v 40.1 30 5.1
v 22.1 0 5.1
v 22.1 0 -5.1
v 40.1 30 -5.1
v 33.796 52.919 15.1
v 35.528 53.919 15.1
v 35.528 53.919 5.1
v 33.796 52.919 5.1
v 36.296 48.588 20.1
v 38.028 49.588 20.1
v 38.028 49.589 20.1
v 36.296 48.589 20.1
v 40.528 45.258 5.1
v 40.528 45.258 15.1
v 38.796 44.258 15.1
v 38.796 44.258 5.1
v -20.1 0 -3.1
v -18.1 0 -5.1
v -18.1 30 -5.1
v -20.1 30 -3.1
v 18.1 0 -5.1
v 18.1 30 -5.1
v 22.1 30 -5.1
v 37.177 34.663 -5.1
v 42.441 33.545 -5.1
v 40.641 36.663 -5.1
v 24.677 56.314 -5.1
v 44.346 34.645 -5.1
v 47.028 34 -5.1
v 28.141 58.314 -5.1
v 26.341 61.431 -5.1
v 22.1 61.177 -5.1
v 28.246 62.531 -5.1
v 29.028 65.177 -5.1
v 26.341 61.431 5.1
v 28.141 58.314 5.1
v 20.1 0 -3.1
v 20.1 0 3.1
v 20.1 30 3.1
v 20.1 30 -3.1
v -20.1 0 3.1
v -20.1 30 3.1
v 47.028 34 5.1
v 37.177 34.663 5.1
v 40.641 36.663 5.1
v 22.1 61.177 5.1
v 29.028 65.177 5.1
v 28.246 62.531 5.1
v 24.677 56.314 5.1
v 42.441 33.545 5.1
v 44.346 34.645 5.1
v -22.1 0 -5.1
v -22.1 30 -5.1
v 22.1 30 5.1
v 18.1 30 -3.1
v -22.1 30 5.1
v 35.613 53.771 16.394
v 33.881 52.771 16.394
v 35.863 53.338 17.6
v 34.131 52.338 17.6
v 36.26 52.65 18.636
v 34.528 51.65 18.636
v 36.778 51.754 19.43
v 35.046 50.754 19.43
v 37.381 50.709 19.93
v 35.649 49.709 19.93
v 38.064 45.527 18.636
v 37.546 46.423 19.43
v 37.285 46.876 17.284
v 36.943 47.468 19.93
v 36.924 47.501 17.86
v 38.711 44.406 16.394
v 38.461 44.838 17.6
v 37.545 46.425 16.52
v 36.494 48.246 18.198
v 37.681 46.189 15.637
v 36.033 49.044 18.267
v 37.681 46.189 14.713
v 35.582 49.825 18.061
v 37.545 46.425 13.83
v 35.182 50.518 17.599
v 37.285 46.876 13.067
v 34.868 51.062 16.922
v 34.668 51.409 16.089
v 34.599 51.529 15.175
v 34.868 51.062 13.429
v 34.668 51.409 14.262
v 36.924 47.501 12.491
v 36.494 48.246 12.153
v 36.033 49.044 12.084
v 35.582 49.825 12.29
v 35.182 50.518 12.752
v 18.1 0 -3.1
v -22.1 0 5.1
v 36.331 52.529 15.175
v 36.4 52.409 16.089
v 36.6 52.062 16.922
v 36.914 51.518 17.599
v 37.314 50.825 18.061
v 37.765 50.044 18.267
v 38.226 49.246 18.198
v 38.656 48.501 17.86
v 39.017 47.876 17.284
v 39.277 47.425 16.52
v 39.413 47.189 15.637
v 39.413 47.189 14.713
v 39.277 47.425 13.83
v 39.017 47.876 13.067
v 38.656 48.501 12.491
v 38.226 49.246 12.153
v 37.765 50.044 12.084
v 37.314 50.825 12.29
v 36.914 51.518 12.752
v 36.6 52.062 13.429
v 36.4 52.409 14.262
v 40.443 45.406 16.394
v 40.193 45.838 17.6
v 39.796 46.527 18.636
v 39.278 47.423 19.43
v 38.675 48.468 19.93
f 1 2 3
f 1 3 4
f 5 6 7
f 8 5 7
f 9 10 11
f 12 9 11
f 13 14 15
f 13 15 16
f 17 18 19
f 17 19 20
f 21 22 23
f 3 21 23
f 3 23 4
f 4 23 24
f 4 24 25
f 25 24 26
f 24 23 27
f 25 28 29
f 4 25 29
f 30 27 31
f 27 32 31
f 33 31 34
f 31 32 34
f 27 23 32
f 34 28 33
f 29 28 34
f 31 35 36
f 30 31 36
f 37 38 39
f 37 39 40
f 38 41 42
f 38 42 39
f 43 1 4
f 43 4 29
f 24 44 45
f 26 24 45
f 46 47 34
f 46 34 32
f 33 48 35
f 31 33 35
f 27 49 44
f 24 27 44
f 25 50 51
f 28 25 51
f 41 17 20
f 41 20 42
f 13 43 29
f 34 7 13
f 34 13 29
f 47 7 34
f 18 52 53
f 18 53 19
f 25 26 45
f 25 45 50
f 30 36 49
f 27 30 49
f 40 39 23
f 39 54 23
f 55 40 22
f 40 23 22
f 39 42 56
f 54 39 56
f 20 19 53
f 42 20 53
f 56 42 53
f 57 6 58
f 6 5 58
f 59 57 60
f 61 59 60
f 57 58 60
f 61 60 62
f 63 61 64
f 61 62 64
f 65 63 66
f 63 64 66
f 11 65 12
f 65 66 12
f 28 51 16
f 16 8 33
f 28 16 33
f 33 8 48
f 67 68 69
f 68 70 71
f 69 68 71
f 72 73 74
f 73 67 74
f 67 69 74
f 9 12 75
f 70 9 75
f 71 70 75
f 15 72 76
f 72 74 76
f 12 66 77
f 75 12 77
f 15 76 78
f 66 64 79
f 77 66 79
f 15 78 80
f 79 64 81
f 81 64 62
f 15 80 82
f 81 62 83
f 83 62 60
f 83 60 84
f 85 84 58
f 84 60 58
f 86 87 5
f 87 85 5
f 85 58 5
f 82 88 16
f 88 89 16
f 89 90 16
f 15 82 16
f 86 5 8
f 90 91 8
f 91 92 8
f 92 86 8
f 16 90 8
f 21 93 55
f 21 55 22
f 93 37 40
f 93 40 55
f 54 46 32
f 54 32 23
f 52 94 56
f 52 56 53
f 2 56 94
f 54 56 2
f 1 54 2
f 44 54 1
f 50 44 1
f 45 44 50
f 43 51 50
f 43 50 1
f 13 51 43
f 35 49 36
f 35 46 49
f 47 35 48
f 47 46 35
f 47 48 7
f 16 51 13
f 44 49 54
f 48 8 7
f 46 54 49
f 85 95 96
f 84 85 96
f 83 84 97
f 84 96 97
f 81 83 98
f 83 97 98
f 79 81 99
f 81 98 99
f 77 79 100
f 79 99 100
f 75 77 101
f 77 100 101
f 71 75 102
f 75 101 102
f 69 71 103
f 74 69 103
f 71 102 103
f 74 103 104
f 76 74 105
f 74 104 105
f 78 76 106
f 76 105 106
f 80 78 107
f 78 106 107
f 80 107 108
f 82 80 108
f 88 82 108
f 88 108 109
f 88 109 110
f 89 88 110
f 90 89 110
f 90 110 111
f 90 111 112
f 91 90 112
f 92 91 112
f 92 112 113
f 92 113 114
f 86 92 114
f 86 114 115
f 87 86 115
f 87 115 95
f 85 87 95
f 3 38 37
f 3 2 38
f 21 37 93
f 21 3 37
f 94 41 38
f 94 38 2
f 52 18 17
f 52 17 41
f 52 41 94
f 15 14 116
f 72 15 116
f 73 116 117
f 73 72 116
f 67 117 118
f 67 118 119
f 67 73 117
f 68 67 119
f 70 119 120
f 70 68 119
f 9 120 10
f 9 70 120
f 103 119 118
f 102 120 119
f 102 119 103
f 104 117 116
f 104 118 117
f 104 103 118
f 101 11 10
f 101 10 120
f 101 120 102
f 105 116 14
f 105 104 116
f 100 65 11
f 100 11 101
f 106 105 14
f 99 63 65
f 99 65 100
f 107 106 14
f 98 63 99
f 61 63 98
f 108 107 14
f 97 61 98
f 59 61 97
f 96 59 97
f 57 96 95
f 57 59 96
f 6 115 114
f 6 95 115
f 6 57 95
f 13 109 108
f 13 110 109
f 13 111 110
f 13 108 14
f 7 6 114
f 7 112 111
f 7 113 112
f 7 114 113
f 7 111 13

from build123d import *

# Parameters (mm, degrees)
BOSS_EXTRUDE1_DEPTH = 30
BOSS_EXTRUDE2_DEPTH = 10.2
CUT_EXTRUDE1_DEPTH  = 10.2
SKETCH4_W           = 15
SKETCH4_H           = 10
BOSS_EXTRUDE3_DEPTH = 2
FILLET1_R           = 5
CUT_EXTRUDE2_REACH  = 85.187
SKETCH5_R           = 3.1


with BuildPart() as part:
    # Sketch1 → Boss-Extrude1 (new body)
    with BuildSketch(Plane(origin=(0, 0, 0), x_dir=(1, 0, 0), z_dir=(0, 1, 0))):
        Polygon((18.1, 3.1), (18.1, 5.1), (22.1, 5.1), (22.1, -5.1), (-22.1, -5.1), (-22.1, 5.1), (-18.1, 5.1), (-20.1, 3.1), (-20.1, -3.1), (20.1, -3.1), (20.1, 3.1), align=None)
    extrude(amount=BOSS_EXTRUDE1_DEPTH)

    # Sketch2 → Boss-Extrude2 (add)
    with BuildSketch(Plane.XY.offset(5.1)):
        Polygon((47.02820323, 34), (29.02820323, 65.176914536), (22.1, 61.176914536), (22.1, 30), (22.1, 0), (40.1, 30), align=None)
    extrude(amount=-BOSS_EXTRUDE2_DEPTH)

    # Sketch3 → Cut-Extrude1 (cut)
    with BuildSketch(Plane.XY.offset(5.1)):
        Polygon((44.346152423, 34.645448267), (28.246152423, 62.531466269), (26.340896534, 61.431466269), (28.140896534, 58.313774815), (24.676794919, 56.313774815), (37.176794919, 34.663139721), (40.640896534, 36.663139721), (42.440896534, 33.545448267), align=None)
    extrude(amount=-CUT_EXTRUDE1_DEPTH, mode=Mode.SUBTRACT)

    # Sketch4 → Boss-Extrude3 (add)
    with BuildSketch(Plane(origin=(49.993584287, 28.863809346, 0), x_dir=(0, 0, -1), z_dir=(0.8660254037844421, 0.49999999999999406, 0))):
        with Locations((-12.6, 23.930762114)):
            Rectangle(SKETCH4_W, SKETCH4_H)
    extrude(amount=-BOSS_EXTRUDE3_DEPTH)

    # Fillet1
    fillet1_edges = [part.edges().sort_by_distance(p)[0] for p in [
        (34.662177826, 53.418584287, 20.1),
        (39.662177826, 44.758330249, 20.1),
    ]]
    fillet(fillet1_edges, radius=FILLET1_R - 0.0001)  # a hair under: the kernel refuses the full size

    # Sketch5 → Cut-Extrude2 (cut, up to next)
    with BuildSketch(Plane(origin=(49.993584287, 28.863809346, 0), x_dir=(0, 0, -1), z_dir=(0.8660254037844421, 0.49999999999999406, 0)), mode=Mode.PRIVATE) as cut_extrude2_sk1:
        with Locations(Location((-15.175304154, 24.225635186, 0), (0, 0, 90))):
            Circle(SKETCH5_R)
    cut_extrude2_tool1 = extrude(cut_extrude2_sk1.sketch, amount=-CUT_EXTRUDE2_REACH, mode=Mode.PRIVATE) & part.part
    add(cut_extrude2_tool1.solids().sort_by_distance((37.880767, 49.843825, 15.175304))[0], mode=Mode.SUBTRACT)


solid = part.part
